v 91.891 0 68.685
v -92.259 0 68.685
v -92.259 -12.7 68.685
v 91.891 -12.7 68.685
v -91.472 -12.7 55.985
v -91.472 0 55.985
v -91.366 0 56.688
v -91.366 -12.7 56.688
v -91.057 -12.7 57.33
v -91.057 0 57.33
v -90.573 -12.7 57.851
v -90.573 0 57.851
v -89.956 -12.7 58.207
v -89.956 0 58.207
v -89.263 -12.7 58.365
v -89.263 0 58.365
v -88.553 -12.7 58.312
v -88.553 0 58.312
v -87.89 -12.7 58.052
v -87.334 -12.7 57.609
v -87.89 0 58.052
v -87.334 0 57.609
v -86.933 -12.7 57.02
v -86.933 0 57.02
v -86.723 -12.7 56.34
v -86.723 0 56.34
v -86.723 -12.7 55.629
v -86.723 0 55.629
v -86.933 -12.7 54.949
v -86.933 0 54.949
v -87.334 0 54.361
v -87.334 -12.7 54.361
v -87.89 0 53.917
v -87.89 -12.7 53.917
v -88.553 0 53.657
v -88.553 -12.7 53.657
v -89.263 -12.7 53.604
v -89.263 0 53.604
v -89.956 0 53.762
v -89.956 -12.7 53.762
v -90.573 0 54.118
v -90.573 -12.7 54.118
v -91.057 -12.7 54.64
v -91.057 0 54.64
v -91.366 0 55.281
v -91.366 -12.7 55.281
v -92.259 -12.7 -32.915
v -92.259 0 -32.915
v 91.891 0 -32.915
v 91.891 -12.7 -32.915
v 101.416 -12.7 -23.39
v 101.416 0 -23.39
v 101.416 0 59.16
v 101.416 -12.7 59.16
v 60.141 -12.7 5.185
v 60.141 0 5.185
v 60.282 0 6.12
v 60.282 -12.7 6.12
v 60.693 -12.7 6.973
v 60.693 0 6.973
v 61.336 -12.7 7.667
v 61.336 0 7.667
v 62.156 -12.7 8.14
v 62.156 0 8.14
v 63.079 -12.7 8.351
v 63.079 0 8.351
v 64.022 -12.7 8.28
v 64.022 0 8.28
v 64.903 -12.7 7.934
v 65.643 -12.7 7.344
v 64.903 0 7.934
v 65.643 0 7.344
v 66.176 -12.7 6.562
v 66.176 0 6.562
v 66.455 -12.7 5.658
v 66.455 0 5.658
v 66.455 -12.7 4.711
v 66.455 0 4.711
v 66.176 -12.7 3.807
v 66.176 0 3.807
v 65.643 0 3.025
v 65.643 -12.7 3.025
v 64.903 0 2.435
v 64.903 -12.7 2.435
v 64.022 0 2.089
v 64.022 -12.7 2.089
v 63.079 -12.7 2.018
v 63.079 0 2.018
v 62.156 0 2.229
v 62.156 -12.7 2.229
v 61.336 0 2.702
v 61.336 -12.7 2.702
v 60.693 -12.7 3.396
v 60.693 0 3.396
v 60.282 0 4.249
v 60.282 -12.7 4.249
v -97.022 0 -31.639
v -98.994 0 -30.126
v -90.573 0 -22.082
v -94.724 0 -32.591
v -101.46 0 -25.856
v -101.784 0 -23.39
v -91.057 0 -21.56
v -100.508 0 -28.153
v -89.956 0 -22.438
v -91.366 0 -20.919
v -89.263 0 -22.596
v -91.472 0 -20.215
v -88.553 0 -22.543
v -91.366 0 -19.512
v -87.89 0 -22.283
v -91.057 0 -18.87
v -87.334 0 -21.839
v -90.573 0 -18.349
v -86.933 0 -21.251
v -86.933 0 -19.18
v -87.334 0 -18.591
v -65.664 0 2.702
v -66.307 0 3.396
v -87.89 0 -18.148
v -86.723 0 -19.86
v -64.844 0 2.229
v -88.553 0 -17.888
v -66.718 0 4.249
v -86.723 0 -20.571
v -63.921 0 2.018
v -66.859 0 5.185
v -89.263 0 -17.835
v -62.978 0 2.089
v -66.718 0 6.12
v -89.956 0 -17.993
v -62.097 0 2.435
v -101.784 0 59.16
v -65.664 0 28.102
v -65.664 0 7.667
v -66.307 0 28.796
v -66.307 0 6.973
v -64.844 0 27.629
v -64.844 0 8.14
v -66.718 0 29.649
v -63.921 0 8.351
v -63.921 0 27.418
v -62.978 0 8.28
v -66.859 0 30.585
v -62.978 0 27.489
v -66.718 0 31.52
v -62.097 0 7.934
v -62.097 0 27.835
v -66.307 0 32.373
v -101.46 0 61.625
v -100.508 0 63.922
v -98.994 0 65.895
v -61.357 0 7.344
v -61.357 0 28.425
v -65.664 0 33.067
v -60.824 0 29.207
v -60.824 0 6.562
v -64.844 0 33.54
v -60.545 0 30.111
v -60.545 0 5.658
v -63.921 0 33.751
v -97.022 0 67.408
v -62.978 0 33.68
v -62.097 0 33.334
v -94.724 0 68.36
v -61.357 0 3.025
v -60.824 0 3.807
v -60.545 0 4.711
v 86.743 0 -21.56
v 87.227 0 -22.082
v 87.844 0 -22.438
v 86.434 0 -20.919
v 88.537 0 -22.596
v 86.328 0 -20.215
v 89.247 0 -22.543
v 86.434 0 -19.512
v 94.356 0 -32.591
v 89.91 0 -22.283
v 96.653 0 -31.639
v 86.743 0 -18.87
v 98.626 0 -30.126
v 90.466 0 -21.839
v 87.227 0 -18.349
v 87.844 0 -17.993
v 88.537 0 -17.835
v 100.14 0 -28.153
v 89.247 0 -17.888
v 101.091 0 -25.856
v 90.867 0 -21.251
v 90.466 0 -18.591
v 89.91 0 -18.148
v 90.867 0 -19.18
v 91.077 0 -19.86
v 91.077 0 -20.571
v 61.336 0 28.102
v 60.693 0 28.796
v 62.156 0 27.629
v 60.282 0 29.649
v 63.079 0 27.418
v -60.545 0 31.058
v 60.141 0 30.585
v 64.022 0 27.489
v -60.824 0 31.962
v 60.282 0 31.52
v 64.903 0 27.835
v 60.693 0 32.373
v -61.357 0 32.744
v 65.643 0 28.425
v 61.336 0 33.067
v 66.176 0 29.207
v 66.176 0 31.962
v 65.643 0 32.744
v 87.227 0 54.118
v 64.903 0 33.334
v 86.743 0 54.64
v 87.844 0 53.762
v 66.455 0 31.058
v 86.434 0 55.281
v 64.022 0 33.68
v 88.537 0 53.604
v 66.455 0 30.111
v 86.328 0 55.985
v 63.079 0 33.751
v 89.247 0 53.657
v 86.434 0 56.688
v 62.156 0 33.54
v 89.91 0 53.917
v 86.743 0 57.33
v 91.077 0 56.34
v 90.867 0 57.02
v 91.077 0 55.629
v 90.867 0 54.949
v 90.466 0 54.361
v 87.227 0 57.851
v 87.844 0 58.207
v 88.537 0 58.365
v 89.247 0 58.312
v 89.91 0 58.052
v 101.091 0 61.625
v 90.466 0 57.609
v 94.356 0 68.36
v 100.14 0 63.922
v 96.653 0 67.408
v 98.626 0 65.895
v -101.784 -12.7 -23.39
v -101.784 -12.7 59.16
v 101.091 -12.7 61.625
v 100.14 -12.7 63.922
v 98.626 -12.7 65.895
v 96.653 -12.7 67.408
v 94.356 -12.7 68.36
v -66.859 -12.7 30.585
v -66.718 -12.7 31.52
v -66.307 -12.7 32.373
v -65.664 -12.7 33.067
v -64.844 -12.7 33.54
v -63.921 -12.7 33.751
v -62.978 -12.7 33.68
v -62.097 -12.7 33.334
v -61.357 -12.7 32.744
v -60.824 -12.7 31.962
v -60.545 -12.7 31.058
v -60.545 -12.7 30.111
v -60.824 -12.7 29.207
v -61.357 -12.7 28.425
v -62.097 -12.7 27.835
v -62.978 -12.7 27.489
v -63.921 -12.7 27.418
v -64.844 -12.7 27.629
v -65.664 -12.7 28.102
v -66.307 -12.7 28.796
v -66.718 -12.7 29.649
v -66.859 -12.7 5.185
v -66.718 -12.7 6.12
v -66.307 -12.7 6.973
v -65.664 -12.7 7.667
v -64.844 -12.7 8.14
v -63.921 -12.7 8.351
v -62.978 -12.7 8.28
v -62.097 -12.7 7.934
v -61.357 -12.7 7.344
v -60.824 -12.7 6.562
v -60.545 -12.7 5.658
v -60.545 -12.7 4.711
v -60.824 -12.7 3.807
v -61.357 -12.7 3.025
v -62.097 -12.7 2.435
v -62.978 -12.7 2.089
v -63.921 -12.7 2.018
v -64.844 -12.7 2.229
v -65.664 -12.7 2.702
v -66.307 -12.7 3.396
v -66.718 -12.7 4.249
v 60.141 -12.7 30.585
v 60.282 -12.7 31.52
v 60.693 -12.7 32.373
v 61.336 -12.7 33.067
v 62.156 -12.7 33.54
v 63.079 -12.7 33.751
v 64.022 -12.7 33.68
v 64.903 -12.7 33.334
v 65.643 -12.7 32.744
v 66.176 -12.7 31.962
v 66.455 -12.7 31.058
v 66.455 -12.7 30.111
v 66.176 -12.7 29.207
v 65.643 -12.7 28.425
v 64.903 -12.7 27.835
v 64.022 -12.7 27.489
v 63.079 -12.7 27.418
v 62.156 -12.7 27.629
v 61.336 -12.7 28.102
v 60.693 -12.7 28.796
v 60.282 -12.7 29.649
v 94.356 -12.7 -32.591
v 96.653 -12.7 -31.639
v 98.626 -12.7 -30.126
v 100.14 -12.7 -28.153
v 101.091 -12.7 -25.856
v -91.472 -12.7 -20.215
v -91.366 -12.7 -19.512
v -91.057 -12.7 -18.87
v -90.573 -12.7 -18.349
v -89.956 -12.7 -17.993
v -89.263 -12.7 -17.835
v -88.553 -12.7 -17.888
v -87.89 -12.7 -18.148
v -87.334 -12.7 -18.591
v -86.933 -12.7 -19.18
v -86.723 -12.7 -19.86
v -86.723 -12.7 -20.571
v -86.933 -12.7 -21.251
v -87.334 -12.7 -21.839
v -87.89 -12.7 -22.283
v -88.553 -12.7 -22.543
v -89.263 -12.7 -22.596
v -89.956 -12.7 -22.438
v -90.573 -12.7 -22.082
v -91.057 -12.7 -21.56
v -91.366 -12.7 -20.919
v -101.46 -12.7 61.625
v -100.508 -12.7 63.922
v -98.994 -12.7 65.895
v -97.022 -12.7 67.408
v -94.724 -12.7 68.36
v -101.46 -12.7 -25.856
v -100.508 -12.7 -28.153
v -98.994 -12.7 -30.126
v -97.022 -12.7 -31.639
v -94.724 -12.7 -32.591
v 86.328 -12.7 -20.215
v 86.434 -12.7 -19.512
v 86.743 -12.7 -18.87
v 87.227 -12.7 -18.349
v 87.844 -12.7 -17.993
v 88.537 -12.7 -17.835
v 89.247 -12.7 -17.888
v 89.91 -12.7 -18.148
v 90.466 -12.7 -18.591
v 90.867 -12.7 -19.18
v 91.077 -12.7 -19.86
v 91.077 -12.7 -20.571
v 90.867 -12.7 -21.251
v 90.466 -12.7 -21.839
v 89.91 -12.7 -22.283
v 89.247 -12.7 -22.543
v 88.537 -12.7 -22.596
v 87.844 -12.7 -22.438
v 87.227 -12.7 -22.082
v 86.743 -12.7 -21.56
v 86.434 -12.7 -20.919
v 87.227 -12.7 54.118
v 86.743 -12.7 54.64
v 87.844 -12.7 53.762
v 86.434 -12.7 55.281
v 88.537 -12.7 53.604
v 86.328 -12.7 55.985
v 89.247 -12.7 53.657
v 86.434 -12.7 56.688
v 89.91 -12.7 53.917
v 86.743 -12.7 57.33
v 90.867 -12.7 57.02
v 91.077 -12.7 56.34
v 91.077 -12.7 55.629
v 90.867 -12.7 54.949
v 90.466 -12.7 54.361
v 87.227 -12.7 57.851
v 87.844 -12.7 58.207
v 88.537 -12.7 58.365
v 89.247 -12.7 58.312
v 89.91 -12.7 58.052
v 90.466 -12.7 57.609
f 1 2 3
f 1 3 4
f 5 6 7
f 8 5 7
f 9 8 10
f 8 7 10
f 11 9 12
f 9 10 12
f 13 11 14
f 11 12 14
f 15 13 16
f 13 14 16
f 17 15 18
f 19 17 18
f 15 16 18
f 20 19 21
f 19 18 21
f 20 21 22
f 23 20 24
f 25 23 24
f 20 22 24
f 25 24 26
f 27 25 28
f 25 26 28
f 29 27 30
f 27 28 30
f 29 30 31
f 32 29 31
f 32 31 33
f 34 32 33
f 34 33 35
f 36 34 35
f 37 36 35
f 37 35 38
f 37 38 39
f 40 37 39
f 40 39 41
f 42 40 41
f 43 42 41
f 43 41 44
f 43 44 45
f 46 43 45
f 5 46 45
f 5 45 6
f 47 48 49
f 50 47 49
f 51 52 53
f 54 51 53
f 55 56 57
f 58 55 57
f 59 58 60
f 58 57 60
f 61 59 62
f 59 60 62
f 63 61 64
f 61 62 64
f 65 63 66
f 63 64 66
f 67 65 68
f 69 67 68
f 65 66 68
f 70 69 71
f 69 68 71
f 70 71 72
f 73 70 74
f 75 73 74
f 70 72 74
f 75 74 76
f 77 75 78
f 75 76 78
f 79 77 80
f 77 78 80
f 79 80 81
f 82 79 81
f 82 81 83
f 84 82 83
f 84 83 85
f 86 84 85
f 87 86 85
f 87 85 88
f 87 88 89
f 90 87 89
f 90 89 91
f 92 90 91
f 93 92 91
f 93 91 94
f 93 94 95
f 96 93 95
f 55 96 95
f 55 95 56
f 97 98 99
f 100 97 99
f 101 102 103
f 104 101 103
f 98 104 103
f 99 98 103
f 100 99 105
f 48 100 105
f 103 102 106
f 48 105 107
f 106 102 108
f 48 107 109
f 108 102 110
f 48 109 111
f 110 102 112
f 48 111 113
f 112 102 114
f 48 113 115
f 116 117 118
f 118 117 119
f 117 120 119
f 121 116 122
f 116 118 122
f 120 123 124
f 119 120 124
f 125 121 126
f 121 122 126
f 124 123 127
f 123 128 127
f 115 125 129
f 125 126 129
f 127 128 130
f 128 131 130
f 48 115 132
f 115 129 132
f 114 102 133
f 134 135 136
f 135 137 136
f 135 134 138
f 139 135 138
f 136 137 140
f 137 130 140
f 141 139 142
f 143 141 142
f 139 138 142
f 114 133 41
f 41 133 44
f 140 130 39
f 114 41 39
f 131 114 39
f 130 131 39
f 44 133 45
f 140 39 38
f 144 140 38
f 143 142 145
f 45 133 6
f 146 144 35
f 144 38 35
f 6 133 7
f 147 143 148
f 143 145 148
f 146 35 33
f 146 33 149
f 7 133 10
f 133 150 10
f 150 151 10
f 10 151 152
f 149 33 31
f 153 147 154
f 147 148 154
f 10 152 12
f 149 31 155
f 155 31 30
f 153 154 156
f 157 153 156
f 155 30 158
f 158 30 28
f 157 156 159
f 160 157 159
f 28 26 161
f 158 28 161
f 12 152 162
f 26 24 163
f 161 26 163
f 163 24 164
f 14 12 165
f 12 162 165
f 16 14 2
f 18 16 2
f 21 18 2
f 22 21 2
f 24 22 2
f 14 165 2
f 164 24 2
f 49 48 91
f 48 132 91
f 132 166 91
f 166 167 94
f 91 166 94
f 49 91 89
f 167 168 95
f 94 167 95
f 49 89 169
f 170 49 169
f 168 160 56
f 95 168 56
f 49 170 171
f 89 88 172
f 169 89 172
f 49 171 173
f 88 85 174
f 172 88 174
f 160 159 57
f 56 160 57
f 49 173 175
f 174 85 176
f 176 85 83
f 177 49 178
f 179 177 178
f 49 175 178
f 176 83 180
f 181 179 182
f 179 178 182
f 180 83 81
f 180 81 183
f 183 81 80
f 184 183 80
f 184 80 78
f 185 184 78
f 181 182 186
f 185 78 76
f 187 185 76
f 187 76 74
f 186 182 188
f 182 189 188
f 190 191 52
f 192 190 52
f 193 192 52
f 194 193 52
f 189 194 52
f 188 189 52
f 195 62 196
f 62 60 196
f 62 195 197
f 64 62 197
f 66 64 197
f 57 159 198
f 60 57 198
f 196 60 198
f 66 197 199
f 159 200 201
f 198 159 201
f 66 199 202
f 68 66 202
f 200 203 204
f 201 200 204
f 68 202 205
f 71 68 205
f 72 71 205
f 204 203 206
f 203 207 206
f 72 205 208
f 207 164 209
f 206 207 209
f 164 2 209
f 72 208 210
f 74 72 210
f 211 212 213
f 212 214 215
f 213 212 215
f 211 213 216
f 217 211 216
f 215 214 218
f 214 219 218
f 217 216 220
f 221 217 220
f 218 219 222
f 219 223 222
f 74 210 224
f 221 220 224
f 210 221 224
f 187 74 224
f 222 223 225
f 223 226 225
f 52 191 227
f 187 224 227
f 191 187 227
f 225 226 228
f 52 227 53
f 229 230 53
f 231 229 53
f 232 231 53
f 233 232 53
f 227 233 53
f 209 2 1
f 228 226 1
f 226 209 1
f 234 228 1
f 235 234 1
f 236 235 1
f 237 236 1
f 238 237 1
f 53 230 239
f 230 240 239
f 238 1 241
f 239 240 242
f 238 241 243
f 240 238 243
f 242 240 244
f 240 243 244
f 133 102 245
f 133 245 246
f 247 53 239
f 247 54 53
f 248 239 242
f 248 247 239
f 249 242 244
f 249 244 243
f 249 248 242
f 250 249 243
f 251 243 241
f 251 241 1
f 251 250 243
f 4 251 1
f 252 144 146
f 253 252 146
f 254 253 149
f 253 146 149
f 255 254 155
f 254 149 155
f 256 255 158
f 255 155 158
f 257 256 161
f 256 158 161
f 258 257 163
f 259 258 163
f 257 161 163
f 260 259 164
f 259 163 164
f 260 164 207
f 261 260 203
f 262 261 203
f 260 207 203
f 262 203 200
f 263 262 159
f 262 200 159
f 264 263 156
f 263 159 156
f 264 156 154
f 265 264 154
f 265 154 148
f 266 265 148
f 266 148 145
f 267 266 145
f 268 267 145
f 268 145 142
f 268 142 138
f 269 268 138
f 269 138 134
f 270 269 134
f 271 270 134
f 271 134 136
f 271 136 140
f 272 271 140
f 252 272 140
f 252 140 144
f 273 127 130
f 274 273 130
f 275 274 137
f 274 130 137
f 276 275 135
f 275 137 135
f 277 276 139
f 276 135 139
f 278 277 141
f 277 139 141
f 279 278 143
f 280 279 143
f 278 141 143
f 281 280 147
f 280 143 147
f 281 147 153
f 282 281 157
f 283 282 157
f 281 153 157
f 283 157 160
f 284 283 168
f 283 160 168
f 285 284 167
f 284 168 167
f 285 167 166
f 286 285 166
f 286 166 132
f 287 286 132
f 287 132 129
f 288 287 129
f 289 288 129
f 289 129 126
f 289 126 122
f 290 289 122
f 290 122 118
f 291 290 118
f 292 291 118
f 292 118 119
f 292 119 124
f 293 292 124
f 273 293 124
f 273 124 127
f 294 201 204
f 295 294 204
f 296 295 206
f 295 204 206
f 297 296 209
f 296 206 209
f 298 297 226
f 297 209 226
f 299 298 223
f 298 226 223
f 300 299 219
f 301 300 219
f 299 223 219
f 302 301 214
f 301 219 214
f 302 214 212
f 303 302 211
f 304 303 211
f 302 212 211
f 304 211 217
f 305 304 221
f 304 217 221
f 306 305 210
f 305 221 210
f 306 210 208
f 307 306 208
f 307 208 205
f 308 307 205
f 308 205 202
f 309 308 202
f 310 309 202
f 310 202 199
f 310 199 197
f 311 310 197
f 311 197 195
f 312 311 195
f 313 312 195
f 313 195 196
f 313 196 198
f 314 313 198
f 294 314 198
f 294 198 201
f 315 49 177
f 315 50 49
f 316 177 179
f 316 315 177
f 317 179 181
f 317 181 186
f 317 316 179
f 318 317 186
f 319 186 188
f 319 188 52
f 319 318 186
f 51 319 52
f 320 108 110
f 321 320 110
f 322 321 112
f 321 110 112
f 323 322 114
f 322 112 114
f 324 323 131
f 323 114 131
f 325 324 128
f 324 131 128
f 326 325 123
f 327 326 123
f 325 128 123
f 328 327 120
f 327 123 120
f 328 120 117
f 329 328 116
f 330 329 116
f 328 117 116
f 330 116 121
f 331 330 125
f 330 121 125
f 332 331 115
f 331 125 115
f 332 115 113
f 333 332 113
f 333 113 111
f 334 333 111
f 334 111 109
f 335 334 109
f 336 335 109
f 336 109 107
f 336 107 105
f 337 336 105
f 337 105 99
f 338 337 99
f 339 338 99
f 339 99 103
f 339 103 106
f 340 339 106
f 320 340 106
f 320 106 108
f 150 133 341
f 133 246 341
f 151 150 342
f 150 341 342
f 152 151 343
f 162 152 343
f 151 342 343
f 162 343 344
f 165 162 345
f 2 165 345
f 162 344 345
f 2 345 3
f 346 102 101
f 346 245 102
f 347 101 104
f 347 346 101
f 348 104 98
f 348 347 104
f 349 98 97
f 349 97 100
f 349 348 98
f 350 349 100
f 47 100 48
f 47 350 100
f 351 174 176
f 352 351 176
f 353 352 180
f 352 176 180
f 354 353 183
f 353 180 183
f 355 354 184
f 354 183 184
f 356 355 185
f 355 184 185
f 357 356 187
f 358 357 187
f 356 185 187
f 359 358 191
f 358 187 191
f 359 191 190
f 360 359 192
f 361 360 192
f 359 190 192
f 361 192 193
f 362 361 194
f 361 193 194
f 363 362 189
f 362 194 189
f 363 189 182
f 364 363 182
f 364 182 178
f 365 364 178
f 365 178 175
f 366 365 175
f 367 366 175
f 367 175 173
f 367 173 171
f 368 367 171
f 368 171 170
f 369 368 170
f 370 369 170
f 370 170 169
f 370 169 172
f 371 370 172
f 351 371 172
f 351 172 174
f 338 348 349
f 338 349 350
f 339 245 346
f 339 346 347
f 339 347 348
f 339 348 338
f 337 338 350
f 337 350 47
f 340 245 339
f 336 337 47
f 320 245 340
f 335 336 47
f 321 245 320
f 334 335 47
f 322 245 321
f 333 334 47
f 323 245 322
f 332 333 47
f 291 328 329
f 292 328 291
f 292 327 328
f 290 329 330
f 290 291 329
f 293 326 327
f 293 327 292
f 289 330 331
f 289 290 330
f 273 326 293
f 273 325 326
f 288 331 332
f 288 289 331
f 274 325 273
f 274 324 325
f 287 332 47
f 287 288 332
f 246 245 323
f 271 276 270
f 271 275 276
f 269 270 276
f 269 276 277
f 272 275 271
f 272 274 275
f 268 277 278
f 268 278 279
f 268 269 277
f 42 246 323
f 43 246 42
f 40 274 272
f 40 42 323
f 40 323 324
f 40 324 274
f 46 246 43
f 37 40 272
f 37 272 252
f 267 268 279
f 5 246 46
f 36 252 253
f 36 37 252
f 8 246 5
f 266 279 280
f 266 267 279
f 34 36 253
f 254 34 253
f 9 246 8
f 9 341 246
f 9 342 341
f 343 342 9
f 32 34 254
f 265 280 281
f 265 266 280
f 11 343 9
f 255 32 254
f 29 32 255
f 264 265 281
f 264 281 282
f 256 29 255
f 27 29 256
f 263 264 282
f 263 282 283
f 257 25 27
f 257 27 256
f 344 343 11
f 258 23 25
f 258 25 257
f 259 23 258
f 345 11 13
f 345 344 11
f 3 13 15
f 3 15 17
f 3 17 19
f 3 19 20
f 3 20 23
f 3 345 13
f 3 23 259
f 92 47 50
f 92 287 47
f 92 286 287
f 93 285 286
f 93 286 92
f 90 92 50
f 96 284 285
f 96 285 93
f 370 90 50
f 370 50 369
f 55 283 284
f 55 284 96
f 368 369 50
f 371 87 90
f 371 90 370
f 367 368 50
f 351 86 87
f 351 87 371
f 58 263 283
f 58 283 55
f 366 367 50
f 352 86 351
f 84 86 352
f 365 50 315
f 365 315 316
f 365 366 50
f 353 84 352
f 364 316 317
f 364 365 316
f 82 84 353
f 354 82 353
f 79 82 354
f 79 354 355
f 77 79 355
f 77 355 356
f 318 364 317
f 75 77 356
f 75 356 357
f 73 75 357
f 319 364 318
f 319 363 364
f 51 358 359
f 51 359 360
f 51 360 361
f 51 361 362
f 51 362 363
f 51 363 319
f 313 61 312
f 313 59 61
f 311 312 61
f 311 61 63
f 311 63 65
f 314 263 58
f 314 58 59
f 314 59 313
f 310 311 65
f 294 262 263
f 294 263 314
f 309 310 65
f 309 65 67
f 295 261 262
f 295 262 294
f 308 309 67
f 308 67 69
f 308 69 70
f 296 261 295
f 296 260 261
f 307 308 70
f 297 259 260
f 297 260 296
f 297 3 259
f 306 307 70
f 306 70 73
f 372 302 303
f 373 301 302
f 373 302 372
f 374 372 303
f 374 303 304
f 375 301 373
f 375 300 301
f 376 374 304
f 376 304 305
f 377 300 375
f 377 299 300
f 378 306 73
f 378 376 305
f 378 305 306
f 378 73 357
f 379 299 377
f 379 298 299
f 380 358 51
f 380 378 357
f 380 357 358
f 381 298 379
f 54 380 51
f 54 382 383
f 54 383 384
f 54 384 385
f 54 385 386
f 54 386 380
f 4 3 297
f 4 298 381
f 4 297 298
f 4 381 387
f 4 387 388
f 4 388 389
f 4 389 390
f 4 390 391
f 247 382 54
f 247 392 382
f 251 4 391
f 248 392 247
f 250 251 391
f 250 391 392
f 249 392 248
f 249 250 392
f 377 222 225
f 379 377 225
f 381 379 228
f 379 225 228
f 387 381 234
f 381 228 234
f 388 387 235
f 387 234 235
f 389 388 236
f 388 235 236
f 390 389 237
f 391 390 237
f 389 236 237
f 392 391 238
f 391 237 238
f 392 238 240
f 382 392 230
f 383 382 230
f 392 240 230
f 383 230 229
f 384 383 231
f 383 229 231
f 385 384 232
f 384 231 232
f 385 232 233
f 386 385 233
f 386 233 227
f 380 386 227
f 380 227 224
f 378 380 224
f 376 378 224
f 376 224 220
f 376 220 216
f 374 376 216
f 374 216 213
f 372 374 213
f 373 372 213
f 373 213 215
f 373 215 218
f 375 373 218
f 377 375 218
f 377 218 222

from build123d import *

# Parameters (mm, degrees)
F0_W     = 203.2
F0_H     = 101.6
F1_DEPTH = 12.7
F2_R     = 9.525
F4_D     = 4.7752
F6_D     = 6.35


with BuildPart() as f1:
    # F0 (on Front) → F1 (new body)
    with BuildSketch(Plane.XZ):
        with Locations((-0.184152, 17.884531)):
            Rectangle(F0_W, F0_H)
    extrude(amount=F1_DEPTH)

    # F2
    f2_edges = [f1.edges().sort_by_distance(p)[0] for p in [
        (-101.784152, -6.35, 68.684531),
        (101.415848, -6.35, 68.684531),
        (101.415848, -6.35, -32.915469),
        (-101.784152, -6.35, -32.915469),
    ]]
    fillet(f2_edges, radius=F2_R)

    # F4 (through all)
    with Locations(Plane.XZ.offset(12.7)):
        with Locations((-89.084152, 55.984531), (-89.084152, -20.215469), (88.715848, -20.215469), (88.715848, 55.984531)):
            Hole(F4_D / 2)

    # F6 (through all)
    with Locations(Plane.XZ.offset(12.7)):
        with Locations((-63.684152, 30.584531), (-63.684152, 5.184531), (63.315848, 5.184531), (63.315848, 30.584531)):
            Hole(F6_D / 2)


solid = f1.part
